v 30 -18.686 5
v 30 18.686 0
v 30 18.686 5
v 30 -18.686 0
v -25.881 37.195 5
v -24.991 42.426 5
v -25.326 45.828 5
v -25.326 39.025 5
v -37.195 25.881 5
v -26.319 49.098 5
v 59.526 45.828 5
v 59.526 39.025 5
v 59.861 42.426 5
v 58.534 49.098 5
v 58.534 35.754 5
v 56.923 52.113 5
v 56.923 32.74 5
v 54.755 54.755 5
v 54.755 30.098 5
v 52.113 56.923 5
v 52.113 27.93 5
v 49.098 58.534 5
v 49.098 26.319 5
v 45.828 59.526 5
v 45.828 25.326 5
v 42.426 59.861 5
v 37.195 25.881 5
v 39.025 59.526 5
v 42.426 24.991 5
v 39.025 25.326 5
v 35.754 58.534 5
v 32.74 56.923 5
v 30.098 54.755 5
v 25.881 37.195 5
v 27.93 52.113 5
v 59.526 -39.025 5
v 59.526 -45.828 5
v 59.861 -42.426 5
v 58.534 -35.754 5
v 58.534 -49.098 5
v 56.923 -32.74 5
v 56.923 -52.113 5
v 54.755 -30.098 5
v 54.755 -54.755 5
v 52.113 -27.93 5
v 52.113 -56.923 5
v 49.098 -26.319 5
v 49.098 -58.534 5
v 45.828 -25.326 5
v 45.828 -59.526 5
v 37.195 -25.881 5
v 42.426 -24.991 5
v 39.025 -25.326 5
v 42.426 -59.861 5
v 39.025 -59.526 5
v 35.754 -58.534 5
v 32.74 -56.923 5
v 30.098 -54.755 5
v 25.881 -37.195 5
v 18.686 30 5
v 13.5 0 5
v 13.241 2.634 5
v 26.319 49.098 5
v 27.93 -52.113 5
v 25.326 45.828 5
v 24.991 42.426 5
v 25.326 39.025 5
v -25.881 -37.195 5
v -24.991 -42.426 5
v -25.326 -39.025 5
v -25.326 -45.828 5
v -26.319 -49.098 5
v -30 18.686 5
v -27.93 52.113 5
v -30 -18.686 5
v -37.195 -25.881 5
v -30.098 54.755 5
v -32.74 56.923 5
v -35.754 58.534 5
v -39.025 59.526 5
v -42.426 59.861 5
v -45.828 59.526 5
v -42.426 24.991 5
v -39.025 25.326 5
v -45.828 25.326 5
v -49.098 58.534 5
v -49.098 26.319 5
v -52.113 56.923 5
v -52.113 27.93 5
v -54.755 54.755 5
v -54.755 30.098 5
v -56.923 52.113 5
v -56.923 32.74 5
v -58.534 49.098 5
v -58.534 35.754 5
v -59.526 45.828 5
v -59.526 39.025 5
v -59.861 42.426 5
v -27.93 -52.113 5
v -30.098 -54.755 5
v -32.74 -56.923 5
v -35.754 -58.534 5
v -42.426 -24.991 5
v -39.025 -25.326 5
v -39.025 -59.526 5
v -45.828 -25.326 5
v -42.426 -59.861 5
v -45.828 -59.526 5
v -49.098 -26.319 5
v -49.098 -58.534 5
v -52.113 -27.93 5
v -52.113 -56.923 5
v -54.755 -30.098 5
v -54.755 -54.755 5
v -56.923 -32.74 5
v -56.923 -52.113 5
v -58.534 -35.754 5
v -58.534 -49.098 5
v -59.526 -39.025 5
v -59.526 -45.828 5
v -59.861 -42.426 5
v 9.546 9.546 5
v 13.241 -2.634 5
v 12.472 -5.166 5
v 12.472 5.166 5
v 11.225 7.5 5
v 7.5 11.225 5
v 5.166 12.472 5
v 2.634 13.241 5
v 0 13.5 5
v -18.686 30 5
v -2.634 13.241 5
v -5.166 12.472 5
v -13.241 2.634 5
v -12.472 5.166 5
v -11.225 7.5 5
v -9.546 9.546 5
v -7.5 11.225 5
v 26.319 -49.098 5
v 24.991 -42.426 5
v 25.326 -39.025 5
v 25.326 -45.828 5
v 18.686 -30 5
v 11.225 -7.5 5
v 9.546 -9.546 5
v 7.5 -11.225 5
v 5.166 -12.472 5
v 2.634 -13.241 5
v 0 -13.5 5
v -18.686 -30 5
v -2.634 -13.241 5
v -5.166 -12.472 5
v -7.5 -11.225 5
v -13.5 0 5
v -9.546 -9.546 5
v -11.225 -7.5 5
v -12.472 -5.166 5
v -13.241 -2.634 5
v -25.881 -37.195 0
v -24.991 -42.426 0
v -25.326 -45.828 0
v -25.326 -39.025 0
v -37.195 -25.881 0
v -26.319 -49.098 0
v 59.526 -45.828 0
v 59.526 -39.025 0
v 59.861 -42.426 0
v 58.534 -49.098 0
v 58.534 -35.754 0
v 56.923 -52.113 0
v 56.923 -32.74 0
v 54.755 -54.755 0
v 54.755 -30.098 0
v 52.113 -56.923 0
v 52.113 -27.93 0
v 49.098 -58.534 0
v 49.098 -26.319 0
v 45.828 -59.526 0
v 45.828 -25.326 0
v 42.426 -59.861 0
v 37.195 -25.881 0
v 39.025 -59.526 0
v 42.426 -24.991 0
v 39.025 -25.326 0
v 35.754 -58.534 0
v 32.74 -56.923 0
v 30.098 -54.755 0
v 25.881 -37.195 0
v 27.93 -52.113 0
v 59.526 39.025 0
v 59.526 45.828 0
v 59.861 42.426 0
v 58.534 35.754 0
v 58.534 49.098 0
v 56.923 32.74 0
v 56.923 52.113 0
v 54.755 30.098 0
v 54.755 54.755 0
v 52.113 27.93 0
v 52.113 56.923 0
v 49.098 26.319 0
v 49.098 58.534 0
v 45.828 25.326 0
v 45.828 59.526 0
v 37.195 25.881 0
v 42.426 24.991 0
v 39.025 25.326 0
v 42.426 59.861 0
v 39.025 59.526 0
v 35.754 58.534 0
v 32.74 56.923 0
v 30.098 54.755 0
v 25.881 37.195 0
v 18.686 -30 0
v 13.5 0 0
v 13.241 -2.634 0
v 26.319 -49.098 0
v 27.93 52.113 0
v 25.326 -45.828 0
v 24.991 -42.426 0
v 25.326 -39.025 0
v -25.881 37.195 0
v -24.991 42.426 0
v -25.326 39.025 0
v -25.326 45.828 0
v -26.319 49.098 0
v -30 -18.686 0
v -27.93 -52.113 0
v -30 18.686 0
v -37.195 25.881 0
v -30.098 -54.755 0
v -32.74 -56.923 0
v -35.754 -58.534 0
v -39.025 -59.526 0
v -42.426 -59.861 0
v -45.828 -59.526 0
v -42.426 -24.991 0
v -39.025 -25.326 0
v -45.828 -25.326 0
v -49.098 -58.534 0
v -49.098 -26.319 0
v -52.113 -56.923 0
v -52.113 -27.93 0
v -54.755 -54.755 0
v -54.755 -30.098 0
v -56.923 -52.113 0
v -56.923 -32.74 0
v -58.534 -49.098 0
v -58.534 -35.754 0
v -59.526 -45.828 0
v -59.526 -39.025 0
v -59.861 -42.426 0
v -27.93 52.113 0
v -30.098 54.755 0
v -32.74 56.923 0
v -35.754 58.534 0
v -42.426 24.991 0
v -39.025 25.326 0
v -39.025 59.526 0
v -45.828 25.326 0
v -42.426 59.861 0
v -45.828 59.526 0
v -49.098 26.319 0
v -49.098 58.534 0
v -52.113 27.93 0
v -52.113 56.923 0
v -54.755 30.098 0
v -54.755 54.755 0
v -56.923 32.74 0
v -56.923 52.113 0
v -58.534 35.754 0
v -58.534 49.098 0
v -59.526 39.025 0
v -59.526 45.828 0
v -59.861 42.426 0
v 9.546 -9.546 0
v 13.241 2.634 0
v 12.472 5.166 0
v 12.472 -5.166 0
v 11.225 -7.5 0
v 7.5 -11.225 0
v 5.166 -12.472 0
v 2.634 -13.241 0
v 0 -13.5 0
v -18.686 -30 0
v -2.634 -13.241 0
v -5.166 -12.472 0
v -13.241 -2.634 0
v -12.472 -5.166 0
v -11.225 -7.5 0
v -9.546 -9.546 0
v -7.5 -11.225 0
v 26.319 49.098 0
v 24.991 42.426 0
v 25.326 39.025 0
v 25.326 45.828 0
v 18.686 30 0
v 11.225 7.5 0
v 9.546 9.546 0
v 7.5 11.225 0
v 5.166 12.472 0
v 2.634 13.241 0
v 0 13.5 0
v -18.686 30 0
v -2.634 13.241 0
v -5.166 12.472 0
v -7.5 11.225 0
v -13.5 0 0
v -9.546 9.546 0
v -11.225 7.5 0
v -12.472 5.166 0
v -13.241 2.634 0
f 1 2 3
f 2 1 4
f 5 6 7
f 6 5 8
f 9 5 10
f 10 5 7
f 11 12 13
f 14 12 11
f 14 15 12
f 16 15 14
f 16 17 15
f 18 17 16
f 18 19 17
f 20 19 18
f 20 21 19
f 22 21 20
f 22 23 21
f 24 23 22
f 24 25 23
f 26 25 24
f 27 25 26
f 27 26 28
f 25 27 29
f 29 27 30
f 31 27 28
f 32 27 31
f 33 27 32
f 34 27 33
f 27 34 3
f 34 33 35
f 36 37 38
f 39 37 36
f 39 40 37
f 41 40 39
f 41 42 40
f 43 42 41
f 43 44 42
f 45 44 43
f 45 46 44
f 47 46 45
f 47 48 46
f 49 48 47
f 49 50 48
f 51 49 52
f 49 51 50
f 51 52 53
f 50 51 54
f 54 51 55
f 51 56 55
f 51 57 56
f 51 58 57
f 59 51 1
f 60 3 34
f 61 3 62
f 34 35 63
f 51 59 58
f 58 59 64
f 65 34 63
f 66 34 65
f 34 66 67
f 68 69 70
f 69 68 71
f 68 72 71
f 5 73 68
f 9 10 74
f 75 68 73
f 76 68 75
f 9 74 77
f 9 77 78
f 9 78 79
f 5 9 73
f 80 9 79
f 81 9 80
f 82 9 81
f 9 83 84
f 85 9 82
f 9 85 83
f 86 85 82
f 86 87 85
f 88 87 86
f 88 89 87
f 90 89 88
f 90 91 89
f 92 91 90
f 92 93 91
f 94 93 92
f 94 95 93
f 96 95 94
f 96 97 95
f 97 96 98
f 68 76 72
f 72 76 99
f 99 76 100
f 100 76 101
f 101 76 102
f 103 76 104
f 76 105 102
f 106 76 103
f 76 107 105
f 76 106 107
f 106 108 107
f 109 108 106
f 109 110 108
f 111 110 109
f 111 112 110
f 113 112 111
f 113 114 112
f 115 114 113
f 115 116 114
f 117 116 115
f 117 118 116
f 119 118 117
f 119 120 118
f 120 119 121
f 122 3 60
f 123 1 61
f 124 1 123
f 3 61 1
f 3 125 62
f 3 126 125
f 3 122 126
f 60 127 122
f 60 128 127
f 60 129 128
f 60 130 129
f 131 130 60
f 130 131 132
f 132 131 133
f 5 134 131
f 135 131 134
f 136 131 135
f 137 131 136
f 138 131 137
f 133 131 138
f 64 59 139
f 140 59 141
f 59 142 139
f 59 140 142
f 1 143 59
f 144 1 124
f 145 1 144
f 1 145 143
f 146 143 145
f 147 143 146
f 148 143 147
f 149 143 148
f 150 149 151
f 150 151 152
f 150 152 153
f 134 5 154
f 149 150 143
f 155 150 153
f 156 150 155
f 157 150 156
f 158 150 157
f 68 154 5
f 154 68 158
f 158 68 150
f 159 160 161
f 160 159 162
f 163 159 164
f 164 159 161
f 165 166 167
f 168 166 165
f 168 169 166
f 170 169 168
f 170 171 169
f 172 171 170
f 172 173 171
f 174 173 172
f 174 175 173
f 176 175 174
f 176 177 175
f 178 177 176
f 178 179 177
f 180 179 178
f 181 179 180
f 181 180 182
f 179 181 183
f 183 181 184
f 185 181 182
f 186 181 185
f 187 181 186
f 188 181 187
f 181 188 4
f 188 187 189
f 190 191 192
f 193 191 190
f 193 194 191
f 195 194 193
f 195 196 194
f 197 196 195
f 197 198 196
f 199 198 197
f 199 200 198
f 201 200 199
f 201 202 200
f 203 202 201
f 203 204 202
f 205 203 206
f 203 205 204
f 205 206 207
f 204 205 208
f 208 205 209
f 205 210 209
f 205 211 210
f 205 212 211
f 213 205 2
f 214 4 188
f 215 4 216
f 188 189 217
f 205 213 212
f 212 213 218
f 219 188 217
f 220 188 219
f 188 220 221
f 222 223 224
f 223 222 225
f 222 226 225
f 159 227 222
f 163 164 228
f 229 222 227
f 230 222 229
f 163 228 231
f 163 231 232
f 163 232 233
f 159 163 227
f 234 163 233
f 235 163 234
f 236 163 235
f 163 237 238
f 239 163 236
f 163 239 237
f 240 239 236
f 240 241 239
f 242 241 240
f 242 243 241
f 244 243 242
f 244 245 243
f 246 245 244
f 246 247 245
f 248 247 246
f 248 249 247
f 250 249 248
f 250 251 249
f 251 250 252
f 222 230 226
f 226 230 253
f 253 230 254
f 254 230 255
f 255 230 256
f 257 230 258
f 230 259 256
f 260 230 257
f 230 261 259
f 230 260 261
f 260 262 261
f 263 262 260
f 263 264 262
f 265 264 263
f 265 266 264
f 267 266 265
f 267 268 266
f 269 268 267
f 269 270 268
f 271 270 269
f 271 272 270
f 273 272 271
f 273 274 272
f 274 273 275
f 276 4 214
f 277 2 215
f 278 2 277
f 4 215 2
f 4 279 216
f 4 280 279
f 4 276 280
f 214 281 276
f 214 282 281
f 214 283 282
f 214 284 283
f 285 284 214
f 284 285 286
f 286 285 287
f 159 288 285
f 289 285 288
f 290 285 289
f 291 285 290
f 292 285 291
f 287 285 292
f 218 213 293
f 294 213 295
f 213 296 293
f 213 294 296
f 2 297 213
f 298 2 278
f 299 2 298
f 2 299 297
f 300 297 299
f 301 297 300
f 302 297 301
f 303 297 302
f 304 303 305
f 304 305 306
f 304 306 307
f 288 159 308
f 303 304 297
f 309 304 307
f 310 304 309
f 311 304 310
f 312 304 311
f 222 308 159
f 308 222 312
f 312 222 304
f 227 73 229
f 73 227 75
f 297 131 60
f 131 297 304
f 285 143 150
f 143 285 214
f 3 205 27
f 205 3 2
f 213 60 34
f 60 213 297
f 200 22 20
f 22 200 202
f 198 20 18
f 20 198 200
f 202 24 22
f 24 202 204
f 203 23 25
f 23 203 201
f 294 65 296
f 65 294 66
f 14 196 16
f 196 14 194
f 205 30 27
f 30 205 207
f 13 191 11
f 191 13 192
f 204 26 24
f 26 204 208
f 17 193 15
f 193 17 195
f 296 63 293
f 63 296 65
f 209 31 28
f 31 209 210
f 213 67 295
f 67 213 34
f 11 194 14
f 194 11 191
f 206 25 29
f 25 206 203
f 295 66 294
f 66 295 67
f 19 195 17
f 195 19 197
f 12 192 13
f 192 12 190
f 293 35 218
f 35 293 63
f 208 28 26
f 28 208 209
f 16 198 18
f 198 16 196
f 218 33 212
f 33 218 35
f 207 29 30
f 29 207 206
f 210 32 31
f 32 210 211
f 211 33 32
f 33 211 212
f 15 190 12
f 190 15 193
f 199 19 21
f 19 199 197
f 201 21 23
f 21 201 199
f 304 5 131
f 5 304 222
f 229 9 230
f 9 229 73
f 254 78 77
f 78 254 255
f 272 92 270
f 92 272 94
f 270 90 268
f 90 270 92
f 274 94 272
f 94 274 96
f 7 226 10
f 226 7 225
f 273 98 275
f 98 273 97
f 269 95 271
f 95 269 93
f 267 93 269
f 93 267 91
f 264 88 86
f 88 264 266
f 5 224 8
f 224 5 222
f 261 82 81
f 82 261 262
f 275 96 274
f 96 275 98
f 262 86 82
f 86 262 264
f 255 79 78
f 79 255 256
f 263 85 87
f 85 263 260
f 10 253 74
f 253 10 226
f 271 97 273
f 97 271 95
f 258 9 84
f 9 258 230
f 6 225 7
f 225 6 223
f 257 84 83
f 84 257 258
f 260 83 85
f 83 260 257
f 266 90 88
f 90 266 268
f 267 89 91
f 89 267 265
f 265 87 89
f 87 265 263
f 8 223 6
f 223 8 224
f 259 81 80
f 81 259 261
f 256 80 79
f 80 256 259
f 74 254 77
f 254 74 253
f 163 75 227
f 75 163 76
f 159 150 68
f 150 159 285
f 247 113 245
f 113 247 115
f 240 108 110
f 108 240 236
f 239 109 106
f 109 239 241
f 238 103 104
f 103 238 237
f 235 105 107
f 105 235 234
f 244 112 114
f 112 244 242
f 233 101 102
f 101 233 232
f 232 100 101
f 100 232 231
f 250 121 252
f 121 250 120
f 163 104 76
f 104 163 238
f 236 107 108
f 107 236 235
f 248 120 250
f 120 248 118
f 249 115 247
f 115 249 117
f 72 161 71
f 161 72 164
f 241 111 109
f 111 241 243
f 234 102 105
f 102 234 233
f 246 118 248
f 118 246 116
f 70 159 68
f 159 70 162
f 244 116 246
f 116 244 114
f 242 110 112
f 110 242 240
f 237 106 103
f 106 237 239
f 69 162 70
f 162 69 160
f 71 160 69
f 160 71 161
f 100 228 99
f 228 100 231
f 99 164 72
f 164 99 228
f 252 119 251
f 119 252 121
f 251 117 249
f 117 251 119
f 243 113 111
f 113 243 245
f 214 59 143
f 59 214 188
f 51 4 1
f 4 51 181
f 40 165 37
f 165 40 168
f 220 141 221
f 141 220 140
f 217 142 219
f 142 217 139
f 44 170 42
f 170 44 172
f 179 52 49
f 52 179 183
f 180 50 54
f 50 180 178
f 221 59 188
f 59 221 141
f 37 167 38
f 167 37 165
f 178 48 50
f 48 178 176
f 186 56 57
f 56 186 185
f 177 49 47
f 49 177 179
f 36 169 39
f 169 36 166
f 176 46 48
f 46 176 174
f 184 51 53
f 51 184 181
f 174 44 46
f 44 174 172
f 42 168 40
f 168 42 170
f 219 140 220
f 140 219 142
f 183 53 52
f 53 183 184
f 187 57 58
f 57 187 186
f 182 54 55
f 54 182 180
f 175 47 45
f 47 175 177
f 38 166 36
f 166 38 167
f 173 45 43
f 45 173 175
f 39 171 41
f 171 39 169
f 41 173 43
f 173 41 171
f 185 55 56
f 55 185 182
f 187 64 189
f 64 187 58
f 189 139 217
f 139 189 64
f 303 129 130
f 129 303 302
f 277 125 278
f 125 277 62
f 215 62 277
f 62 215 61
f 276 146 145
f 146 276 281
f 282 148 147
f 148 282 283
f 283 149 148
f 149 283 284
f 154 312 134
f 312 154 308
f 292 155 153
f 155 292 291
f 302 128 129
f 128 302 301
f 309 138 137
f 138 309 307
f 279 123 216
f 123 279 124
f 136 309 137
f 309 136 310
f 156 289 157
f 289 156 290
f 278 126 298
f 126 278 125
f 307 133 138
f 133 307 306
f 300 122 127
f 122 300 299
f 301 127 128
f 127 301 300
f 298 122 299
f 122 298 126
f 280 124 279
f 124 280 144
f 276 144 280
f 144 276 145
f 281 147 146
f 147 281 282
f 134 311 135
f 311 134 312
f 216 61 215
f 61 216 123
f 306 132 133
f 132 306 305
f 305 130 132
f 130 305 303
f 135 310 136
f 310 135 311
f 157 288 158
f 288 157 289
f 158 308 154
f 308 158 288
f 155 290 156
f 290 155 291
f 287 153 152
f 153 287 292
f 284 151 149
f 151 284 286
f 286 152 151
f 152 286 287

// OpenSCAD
$fn = 32;

// ----------------------------------------------------------------------
// Quadcopter frame: 154.88 mm across the motor pads, arms 60 mm
// ----------------------------------------------------------------------

// --- parameters (mm) ---
hub = 60;                 // central plate size
plate_t = 5;              // plate thickness
arm_len = 60;             // hub centre to motor pad centre
bar_w = 16;               // arm width
pad_d = 34.87;            // motor pad diameter
centre_d = 27;            // central cut-out for the stack

module arm_bar() {
  /* flat bar: hull of a stub inside the hub and a box at the pad */
  hull() {
    translate([hub / 4, 0, plate_t / 2]) cube([bar_w, bar_w, plate_t], center = true);
    translate([arm_len, 0, plate_t / 2]) cube([bar_w, bar_w, plate_t], center = true);
  }
}

module pad() {
  translate([arm_len, 0, 0]) cylinder(h = plate_t, d = pad_d);
}

module frame() {
  translate([-hub / 2, -hub / 2, 0]) cube([hub, hub, plate_t]);
  rotate([0, 0, 45]) arm_bar();
  rotate([0, 0, 45]) pad();
  rotate([0, 0, 135]) arm_bar();
  rotate([0, 0, 135]) pad();
  rotate([0, 0, 225]) arm_bar();
  rotate([0, 0, 225]) pad();
  rotate([0, 0, 315]) arm_bar();
  rotate([0, 0, 315]) pad();
}

difference() {
  frame();
  translate([0, 0, -1]) cylinder(h = plate_t + 2, d = centre_d);
}
